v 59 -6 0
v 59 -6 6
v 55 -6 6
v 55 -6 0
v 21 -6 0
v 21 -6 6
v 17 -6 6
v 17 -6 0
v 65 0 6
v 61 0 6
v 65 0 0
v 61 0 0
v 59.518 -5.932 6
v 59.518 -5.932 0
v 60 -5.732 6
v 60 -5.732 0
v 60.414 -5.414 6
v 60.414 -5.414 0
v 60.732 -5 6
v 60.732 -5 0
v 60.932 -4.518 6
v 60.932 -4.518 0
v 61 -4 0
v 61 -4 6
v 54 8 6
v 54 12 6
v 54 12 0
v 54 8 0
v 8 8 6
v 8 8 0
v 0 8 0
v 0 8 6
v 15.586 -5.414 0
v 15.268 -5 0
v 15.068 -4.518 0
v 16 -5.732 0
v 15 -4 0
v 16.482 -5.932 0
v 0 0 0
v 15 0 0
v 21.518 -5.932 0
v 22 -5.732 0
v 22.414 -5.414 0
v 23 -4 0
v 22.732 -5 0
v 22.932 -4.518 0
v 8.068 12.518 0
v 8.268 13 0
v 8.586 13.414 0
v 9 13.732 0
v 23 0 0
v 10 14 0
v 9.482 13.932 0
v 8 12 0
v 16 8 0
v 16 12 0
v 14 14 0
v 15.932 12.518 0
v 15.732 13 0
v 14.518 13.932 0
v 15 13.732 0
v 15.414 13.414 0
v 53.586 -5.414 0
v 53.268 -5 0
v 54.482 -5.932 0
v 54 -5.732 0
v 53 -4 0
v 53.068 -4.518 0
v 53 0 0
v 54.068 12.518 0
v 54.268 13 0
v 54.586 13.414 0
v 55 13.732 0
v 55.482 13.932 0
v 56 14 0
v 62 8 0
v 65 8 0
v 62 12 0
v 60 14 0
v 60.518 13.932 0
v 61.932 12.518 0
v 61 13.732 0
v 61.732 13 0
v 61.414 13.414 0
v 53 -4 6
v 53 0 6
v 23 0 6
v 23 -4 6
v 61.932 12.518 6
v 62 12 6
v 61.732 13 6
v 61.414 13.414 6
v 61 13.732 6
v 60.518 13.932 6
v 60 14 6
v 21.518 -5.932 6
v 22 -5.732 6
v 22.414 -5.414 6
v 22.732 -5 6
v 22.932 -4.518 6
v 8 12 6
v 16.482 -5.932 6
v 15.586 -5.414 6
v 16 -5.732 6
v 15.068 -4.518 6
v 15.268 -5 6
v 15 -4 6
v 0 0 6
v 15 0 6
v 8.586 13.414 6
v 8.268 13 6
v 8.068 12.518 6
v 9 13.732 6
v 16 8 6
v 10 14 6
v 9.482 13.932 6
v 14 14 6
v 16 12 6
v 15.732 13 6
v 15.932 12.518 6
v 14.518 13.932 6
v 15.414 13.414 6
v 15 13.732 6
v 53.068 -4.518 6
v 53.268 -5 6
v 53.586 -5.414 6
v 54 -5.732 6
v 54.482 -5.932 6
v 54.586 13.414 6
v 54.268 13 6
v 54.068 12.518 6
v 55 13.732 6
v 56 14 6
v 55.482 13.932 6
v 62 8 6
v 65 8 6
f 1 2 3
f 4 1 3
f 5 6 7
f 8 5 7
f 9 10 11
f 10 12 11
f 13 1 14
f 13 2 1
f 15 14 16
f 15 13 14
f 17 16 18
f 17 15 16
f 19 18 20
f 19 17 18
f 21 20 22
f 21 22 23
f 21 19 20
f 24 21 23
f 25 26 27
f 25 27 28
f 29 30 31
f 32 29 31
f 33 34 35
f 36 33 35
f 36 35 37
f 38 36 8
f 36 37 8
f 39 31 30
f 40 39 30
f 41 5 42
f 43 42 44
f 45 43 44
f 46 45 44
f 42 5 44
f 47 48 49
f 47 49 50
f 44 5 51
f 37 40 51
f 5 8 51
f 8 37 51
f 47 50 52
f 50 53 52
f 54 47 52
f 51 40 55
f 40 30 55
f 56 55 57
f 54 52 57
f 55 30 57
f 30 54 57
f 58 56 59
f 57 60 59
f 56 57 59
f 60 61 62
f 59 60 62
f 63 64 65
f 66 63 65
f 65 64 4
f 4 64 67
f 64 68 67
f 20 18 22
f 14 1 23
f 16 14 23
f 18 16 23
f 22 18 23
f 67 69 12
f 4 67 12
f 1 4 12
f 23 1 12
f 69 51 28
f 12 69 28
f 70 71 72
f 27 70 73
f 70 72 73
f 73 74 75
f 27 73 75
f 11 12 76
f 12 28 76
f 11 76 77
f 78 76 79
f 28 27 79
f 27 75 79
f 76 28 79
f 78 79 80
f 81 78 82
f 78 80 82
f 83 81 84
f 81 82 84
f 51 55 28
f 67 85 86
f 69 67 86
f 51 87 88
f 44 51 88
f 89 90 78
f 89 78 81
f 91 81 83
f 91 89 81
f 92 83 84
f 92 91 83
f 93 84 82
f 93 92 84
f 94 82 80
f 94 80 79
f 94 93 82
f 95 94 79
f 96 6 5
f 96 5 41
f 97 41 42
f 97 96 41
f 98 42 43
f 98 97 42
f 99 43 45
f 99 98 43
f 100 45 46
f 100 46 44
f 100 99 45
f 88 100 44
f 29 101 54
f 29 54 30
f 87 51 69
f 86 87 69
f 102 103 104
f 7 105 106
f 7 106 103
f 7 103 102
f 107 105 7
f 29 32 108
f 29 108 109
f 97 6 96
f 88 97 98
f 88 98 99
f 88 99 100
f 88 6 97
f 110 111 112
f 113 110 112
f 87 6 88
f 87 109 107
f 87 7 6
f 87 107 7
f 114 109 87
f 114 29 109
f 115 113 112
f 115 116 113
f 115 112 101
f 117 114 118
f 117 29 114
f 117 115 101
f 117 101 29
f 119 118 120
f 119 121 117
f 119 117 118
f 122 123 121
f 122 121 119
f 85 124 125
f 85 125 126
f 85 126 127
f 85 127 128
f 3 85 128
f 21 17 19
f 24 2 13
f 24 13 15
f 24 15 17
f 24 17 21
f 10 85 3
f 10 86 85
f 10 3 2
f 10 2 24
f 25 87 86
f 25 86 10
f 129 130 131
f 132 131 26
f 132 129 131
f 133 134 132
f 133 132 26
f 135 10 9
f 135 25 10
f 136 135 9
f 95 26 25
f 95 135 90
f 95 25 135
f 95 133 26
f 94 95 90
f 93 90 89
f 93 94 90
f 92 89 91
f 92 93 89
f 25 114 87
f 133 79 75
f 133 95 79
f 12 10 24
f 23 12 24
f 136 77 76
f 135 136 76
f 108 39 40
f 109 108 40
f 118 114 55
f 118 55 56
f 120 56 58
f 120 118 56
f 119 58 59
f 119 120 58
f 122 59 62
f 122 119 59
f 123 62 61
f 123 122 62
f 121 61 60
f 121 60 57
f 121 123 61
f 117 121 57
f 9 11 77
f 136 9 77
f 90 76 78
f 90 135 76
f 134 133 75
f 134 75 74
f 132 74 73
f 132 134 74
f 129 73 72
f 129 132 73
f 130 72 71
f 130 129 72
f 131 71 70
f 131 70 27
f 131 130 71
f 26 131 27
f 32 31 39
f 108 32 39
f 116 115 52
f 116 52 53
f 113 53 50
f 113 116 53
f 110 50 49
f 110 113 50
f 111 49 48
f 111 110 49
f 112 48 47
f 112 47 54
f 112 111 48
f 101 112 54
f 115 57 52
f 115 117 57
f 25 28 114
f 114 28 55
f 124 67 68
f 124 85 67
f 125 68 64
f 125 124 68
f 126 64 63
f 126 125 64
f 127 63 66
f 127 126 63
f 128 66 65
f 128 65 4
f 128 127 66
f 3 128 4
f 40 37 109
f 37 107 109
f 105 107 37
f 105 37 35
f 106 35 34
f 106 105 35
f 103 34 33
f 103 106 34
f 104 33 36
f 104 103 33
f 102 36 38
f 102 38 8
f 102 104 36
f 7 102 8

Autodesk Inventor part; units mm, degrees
ref_plane "YZ Plane" through (0, 0, 0) normal (1, 0, 0) x (0, 1, 0)
ref_plane "XZ Plane" through (0, 0, 0) normal (0, 1, 0) x (-1, 0, 0)
ref_plane "XY Plane" through (0, 0, 0) normal (0, 0, 1) x (1, 0, 0)
sketch "Sketch1" plane through (0, 0, 0) normal (0, 0, 1) x (1, 0, 0)
  line L0 (0, 0) -> (65, 0)
  line L1 (65, 0) -> (65, 8)
  line L2 (65, 8) -> (0, 8)
  line L3 (0, 8) -> (0, 0)
  dimension "d0" = 8
  dimension "d1" = 65
extrude "Extrusion1" add sketch "Sketch1" along normal blind 6
sketch "Sketch2" plane through (0, 0, 6) normal (0, 0, 1) x (1, 0, 0)
  line L0 (0, 0) -> (65, 0) projected
  line L1 (65, 8) -> (0, 8) projected
  line L2 (0, 8) -> (0, 0) projected
  line L3 (15, 0) -> (23, 0)
  line L4 (23, 0) -> (23, -4)
  line L5 (21, -6) -> (17, -6)
  line L6 (15, -4) -> (15, 0)
  line L7 (53, 0) -> (61, 0)
  line L8 (61, 0) -> (61, -4)
  line L9 (59, -6) -> (55, -6)
  line L10 (53, -4) -> (53, 0)
  line L11 (8, 8) -> (16, 8)
  line L12 (16, 8) -> (16, 12)
  line L13 (14, 14) -> (10, 14)
  line L14 (8, 12) -> (8, 8)
  line L15 (54, 8) -> (62, 8)
  line L16 (62, 8) -> (62, 12)
  line L17 (60, 14) -> (56, 14)
  line L18 (54, 12) -> (54, 8)
  arc A0 (15, -4) -> (17, -6) centre (17, -4) ccw
  arc A1 (21, -6) -> (23, -4) centre (21, -4) ccw
  arc A2 (10, 14) -> (8, 12) centre (10, 12) ccw
  arc A3 (16, 12) -> (14, 14) centre (14, 12) ccw
  arc A4 (56, 14) -> (54, 12) centre (56, 12) ccw
  arc A5 (62, 12) -> (60, 14) centre (60, 12) ccw
  arc A6 (53, -4) -> (55, -6) centre (55, -4) ccw
  arc A7 (59, -6) -> (61, -4) centre (59, -4) ccw
  dimension "d4" = 2
  dimension "d5" = 8
  dimension "d6" = 6
  dimension "d7" = 6
  dimension "d8" = 8
  dimension "d9" = 8
  dimension "d10" = 8
  dimension "d11" = 15
  dimension "d12" = 30
  dimension "d13" = 8
  dimension "d14" = 38
extrude "Extrusion2" add sketch "Sketch2" against normal blind 6
properties part number "x_motor_smooth_rod_spacer"
